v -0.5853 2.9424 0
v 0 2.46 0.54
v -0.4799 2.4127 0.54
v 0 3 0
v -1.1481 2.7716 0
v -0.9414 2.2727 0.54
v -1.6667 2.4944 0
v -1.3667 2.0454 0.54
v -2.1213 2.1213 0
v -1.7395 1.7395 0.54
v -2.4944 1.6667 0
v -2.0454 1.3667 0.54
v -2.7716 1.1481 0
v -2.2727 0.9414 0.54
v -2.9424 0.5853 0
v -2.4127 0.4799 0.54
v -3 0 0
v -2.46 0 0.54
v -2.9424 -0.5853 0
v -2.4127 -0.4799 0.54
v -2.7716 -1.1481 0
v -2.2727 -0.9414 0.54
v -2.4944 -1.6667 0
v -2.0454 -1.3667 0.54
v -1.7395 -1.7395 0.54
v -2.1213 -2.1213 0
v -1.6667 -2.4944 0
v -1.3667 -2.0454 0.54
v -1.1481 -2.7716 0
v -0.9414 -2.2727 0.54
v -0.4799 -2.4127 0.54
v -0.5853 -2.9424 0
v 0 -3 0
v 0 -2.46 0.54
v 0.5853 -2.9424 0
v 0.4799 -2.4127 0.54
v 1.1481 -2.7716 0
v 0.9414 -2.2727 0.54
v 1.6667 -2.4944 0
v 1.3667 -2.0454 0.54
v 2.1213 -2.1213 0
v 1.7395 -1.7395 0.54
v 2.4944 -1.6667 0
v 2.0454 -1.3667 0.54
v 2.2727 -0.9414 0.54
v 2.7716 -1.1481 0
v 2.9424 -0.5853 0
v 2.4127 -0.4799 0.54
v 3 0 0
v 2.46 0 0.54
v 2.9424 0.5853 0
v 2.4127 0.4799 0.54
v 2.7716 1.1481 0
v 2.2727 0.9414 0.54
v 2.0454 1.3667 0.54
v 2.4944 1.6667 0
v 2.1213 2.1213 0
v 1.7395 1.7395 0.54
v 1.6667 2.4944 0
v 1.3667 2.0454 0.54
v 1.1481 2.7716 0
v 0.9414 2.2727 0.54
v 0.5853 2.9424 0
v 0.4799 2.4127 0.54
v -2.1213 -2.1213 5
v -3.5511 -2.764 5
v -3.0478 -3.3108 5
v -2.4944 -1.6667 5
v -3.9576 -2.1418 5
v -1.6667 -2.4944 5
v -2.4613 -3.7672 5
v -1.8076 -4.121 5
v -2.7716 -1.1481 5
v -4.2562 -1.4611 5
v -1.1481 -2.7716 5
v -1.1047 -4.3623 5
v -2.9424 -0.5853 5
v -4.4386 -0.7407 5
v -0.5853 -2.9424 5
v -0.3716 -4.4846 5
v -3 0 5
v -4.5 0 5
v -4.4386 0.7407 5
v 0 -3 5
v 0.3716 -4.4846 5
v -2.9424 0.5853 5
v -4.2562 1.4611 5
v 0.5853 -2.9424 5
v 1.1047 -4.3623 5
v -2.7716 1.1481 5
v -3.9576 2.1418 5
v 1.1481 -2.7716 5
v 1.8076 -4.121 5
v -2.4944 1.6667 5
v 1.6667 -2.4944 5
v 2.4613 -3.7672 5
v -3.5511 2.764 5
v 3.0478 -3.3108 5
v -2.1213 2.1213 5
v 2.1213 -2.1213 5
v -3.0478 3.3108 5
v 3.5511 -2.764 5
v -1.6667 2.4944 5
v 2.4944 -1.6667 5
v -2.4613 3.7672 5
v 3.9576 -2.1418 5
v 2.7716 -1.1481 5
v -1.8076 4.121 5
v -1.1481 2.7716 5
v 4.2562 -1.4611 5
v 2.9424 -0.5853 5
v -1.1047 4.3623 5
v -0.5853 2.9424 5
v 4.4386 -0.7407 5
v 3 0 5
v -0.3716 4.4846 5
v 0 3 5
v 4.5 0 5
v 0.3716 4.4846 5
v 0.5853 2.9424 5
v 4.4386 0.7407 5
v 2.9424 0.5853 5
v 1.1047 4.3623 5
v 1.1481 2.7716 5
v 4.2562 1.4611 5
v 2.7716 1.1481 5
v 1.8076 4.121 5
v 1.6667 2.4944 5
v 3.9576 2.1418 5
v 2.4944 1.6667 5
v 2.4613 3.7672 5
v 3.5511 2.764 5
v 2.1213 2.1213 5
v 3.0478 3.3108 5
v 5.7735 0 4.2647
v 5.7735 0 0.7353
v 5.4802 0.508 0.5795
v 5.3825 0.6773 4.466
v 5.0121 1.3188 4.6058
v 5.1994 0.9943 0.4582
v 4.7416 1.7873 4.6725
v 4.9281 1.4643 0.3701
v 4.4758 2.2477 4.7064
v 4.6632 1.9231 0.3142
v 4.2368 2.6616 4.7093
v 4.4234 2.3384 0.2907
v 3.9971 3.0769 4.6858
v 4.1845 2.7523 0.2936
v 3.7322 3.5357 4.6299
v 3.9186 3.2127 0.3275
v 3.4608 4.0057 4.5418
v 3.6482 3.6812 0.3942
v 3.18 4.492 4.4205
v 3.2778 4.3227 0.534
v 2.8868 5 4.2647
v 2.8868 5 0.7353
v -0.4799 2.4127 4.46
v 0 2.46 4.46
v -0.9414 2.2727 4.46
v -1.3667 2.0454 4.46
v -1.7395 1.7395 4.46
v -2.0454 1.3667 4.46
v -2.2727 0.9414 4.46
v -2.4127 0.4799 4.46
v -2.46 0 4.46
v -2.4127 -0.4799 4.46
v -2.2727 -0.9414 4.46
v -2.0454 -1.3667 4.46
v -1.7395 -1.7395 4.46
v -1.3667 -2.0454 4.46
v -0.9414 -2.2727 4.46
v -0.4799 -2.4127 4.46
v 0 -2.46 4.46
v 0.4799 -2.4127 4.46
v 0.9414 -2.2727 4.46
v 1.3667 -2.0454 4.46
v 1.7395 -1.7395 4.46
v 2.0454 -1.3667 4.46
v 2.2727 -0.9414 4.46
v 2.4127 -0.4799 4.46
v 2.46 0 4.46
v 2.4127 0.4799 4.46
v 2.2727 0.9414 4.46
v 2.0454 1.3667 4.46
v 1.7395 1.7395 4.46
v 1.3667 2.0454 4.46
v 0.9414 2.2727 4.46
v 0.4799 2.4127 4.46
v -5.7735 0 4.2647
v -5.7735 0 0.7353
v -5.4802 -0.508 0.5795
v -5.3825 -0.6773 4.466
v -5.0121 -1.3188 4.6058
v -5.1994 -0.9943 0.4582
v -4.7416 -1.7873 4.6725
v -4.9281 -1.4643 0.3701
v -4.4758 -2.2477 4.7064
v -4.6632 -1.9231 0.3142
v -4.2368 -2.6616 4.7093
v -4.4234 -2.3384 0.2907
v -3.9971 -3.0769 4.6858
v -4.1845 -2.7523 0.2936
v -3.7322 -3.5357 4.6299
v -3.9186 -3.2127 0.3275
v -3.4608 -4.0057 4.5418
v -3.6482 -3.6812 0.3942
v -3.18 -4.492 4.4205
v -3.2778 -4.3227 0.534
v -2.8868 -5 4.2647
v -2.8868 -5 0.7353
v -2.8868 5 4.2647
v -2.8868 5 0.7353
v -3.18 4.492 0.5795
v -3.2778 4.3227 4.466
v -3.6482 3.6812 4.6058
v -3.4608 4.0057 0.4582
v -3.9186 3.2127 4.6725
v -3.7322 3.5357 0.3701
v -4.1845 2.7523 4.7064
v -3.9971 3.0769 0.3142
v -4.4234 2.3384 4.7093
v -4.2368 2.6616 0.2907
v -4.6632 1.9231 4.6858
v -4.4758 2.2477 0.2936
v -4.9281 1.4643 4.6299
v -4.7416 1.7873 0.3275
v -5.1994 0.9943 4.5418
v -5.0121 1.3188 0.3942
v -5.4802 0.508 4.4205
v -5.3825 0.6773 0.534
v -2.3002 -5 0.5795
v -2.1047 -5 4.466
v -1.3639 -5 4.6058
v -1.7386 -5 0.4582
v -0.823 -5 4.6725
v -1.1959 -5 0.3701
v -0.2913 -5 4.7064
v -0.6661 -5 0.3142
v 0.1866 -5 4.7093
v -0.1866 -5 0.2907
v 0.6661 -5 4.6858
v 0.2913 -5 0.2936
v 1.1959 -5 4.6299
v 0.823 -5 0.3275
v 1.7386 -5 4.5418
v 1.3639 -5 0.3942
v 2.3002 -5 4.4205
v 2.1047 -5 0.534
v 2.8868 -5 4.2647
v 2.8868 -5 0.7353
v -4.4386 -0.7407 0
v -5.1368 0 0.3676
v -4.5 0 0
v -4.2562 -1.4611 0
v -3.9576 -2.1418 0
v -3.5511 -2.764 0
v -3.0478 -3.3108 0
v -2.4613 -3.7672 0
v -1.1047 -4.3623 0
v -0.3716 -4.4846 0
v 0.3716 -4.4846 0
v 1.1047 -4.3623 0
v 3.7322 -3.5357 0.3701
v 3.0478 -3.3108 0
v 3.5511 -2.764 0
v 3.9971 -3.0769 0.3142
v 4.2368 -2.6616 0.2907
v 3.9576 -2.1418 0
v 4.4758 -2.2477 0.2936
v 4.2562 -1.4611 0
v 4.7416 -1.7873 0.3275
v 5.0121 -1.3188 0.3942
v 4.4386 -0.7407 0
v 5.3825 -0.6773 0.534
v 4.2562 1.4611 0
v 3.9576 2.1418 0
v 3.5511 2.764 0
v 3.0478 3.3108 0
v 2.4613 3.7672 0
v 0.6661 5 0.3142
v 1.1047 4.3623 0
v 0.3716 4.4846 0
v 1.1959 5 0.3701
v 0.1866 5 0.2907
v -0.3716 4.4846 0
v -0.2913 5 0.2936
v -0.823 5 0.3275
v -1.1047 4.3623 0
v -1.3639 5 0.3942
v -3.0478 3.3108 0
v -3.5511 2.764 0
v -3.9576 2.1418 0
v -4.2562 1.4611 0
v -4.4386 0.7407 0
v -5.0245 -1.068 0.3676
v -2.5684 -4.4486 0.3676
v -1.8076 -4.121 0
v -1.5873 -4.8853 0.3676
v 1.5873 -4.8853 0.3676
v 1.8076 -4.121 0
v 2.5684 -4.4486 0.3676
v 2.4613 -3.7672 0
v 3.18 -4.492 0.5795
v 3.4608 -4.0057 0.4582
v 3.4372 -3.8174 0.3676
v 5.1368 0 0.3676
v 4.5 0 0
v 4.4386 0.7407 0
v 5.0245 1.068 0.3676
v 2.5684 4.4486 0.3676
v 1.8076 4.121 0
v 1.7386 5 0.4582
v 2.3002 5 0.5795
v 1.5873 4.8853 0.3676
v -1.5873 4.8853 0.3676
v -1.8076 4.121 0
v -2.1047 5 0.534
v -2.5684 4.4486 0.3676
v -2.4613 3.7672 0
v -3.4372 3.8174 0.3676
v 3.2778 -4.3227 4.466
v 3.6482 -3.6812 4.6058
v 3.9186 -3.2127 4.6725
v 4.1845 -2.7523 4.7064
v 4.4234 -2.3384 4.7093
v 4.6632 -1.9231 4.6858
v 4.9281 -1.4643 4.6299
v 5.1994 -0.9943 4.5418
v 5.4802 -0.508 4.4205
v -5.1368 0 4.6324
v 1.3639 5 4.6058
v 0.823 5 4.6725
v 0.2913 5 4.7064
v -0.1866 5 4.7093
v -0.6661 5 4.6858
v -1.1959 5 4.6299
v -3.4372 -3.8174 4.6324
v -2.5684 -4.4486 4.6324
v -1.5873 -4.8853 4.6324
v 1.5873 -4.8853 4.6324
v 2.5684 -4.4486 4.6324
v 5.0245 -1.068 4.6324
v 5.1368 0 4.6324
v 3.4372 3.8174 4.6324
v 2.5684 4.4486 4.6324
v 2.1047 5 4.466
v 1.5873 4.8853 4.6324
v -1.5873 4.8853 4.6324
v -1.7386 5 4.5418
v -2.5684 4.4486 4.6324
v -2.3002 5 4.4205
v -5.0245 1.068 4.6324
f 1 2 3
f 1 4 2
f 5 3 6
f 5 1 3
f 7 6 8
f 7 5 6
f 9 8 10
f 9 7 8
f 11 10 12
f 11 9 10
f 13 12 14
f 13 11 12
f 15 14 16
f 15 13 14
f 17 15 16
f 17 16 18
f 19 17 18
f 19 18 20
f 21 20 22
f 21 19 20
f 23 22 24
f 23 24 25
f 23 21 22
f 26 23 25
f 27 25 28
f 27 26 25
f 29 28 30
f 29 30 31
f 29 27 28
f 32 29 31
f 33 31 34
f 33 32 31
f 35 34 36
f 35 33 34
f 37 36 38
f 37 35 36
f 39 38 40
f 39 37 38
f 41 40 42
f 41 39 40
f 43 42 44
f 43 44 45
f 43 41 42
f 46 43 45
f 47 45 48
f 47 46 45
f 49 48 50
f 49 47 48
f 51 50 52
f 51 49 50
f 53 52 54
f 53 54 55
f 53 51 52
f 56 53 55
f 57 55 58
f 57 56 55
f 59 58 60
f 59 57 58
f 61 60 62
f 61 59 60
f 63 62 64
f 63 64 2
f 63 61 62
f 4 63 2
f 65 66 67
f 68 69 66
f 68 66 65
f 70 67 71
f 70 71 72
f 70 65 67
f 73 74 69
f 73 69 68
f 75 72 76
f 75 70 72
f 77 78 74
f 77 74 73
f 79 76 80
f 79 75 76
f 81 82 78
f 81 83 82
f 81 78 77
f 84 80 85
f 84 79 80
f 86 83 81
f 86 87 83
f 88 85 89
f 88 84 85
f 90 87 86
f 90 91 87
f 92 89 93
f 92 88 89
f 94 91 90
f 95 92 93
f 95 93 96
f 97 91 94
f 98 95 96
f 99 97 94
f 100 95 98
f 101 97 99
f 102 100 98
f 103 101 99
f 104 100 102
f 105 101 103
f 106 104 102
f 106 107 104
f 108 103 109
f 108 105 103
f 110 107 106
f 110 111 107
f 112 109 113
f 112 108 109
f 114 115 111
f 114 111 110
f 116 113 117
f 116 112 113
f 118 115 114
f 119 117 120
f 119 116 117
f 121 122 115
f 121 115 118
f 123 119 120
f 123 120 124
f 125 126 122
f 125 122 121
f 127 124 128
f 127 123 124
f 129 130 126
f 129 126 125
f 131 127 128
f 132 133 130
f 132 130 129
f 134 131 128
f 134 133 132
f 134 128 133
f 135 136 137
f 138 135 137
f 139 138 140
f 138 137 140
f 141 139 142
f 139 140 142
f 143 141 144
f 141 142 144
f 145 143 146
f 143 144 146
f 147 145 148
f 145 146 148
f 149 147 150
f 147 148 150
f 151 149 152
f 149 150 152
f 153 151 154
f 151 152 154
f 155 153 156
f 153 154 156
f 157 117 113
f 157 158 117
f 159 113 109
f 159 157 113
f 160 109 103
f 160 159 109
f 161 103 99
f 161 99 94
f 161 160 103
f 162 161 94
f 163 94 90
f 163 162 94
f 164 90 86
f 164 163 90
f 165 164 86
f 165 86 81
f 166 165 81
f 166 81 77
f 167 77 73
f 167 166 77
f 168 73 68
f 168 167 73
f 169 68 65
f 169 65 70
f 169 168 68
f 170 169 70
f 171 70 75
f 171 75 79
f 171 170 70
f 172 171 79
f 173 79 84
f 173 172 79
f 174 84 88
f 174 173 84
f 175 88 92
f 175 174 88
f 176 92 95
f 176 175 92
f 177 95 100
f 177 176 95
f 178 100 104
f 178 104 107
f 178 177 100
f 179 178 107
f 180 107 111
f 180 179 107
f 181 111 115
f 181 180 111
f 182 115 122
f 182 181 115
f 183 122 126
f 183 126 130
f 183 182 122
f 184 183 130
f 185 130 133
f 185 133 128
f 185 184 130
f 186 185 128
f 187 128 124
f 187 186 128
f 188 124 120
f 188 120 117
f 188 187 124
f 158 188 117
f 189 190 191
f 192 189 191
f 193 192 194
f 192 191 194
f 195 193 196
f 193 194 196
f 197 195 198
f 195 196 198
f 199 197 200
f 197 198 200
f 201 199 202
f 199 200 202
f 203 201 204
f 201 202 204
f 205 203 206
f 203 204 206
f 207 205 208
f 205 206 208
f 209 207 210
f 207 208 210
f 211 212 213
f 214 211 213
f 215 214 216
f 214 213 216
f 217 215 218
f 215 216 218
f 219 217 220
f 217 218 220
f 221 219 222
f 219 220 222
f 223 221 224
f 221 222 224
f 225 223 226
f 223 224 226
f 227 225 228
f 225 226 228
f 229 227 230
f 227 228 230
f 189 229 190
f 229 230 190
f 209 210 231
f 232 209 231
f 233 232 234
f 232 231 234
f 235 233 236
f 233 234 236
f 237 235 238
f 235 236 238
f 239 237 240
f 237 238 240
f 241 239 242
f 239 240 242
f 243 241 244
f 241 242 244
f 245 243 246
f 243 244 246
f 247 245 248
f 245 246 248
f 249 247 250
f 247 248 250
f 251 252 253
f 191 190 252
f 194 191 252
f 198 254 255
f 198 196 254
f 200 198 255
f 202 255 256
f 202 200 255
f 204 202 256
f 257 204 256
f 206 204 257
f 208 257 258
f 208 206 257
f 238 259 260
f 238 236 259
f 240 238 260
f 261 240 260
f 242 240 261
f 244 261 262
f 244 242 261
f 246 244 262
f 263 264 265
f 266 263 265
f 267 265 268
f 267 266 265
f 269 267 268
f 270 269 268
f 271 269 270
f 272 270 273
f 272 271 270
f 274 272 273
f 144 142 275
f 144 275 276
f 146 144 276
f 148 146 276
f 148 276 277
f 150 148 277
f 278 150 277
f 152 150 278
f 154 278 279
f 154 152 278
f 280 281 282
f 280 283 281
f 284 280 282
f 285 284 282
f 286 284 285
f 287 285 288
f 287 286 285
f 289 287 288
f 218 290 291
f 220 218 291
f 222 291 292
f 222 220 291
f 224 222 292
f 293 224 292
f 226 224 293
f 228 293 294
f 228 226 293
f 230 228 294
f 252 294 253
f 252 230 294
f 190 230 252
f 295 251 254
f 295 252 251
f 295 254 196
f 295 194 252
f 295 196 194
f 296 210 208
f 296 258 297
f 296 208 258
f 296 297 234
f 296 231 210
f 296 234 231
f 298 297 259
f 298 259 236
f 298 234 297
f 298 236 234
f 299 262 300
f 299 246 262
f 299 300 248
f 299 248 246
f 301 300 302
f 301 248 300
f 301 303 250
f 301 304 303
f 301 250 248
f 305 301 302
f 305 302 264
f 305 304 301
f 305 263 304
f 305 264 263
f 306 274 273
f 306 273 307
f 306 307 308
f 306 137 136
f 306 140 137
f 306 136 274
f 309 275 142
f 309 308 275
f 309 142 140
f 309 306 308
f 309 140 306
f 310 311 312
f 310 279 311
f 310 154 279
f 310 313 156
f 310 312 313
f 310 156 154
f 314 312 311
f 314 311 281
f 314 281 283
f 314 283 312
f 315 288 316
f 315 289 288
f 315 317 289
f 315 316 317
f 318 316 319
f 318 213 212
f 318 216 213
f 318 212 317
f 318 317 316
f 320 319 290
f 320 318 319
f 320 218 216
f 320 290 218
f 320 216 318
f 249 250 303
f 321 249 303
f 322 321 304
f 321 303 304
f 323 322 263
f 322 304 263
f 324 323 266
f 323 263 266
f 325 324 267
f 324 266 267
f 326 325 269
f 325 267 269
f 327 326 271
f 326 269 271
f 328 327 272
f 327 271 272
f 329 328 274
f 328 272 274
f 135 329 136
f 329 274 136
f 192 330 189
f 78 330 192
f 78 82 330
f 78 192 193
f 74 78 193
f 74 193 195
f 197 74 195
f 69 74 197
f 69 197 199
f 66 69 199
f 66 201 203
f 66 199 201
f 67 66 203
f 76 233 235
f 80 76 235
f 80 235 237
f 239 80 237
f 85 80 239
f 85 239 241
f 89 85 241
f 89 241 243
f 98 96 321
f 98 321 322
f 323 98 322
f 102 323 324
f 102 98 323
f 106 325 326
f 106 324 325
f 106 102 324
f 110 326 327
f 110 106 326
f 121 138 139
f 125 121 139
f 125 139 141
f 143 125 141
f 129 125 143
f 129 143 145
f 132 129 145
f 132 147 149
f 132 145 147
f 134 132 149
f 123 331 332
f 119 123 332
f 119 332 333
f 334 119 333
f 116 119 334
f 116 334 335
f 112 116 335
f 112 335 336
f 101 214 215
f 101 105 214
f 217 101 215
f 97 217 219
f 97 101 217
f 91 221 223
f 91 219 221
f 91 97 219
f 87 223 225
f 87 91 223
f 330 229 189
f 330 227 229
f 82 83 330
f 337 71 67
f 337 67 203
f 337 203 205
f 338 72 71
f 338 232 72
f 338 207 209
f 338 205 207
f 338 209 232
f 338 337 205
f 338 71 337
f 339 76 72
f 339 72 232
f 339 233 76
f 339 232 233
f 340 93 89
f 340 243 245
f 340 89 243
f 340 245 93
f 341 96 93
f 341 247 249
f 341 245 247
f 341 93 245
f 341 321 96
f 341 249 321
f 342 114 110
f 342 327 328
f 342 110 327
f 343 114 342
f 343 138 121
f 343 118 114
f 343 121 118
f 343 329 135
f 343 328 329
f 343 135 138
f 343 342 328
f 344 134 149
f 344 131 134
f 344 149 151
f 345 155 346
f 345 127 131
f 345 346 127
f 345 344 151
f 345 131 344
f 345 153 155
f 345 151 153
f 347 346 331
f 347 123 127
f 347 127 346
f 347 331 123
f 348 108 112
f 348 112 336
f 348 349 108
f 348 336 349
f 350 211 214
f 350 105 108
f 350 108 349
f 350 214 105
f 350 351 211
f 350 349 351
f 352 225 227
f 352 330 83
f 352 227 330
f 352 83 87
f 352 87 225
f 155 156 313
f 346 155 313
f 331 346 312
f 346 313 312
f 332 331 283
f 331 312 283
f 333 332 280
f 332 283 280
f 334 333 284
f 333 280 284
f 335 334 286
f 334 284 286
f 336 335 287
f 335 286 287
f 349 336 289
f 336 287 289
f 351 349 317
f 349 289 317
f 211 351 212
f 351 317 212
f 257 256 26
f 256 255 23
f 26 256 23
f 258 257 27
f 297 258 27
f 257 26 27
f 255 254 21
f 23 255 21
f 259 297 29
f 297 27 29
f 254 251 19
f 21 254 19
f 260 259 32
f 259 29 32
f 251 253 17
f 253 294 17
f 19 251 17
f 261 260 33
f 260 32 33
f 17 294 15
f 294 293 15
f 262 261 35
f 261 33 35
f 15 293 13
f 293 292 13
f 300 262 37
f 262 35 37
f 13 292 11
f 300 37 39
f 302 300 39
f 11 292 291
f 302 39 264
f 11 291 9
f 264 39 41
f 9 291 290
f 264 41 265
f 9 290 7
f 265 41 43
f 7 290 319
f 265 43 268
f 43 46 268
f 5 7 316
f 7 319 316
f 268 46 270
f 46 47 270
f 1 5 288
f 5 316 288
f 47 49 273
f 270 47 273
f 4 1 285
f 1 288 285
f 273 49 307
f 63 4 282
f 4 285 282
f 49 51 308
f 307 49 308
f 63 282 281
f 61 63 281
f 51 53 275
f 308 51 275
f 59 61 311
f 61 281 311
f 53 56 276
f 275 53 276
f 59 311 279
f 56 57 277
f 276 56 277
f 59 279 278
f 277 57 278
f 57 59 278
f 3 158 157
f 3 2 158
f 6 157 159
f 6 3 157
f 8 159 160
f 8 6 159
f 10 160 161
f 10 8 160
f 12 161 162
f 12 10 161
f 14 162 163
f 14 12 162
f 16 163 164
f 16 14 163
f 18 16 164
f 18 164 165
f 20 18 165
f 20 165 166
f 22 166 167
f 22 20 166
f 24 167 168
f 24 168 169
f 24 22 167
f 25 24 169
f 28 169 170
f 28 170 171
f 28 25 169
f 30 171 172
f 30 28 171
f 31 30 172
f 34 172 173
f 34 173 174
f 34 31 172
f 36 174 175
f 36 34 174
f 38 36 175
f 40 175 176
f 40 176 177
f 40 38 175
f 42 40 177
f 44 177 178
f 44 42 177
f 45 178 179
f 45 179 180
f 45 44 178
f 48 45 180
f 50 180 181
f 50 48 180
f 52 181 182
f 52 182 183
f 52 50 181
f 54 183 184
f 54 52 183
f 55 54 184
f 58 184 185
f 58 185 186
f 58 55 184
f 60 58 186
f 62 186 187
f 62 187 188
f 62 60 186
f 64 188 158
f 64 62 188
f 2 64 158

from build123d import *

# Parameters (mm, degrees)
EXTRUDE_350_DEPTH = 5


with BuildPart() as part:
    # Эскиз2 → Extrude 350 (new body)
    with BuildSketch(Plane.XY):
        Polygon((5.773502692, 0), (2.886751346, 5), (-2.886751346, 5), (-5.773502692, 0), (-2.886751346, -5), (2.886751346, -5), align=None)
    extrude(amount=EXTRUDE_350_DEPTH)

    # Эскиз3 → Вырез-Повернуть1 (revolve, cut)
    with BuildSketch(Plane(origin=(0, 0, 0), x_dir=(1, 0, 0), z_dir=(0, 1, 0))):
        Polygon((-5.773502692, 0), (-4.5, 0), (-5.773502692, -0.735257122), align=None)
        Polygon((-5.773502692, -5), (-5.773502692, -4.264742878), (-4.5, -5), align=None)
    revolve(axis=Axis((0, 0, -10), (0, 0, 1)), mode=Mode.SUBTRACT)

    # Эскиз4 → Hole Wizard 701 (revolve, cut)
    with BuildSketch(Plane.YZ):
        Polygon((0, 0), (0, 5), (3, 5), (2.46, 4.46), (2.46, 0.54), (3, 0), align=None)
    revolve(axis=Axis((0, 0, -6.35), (0, 0, 1)), mode=Mode.SUBTRACT)


solid = part.part
